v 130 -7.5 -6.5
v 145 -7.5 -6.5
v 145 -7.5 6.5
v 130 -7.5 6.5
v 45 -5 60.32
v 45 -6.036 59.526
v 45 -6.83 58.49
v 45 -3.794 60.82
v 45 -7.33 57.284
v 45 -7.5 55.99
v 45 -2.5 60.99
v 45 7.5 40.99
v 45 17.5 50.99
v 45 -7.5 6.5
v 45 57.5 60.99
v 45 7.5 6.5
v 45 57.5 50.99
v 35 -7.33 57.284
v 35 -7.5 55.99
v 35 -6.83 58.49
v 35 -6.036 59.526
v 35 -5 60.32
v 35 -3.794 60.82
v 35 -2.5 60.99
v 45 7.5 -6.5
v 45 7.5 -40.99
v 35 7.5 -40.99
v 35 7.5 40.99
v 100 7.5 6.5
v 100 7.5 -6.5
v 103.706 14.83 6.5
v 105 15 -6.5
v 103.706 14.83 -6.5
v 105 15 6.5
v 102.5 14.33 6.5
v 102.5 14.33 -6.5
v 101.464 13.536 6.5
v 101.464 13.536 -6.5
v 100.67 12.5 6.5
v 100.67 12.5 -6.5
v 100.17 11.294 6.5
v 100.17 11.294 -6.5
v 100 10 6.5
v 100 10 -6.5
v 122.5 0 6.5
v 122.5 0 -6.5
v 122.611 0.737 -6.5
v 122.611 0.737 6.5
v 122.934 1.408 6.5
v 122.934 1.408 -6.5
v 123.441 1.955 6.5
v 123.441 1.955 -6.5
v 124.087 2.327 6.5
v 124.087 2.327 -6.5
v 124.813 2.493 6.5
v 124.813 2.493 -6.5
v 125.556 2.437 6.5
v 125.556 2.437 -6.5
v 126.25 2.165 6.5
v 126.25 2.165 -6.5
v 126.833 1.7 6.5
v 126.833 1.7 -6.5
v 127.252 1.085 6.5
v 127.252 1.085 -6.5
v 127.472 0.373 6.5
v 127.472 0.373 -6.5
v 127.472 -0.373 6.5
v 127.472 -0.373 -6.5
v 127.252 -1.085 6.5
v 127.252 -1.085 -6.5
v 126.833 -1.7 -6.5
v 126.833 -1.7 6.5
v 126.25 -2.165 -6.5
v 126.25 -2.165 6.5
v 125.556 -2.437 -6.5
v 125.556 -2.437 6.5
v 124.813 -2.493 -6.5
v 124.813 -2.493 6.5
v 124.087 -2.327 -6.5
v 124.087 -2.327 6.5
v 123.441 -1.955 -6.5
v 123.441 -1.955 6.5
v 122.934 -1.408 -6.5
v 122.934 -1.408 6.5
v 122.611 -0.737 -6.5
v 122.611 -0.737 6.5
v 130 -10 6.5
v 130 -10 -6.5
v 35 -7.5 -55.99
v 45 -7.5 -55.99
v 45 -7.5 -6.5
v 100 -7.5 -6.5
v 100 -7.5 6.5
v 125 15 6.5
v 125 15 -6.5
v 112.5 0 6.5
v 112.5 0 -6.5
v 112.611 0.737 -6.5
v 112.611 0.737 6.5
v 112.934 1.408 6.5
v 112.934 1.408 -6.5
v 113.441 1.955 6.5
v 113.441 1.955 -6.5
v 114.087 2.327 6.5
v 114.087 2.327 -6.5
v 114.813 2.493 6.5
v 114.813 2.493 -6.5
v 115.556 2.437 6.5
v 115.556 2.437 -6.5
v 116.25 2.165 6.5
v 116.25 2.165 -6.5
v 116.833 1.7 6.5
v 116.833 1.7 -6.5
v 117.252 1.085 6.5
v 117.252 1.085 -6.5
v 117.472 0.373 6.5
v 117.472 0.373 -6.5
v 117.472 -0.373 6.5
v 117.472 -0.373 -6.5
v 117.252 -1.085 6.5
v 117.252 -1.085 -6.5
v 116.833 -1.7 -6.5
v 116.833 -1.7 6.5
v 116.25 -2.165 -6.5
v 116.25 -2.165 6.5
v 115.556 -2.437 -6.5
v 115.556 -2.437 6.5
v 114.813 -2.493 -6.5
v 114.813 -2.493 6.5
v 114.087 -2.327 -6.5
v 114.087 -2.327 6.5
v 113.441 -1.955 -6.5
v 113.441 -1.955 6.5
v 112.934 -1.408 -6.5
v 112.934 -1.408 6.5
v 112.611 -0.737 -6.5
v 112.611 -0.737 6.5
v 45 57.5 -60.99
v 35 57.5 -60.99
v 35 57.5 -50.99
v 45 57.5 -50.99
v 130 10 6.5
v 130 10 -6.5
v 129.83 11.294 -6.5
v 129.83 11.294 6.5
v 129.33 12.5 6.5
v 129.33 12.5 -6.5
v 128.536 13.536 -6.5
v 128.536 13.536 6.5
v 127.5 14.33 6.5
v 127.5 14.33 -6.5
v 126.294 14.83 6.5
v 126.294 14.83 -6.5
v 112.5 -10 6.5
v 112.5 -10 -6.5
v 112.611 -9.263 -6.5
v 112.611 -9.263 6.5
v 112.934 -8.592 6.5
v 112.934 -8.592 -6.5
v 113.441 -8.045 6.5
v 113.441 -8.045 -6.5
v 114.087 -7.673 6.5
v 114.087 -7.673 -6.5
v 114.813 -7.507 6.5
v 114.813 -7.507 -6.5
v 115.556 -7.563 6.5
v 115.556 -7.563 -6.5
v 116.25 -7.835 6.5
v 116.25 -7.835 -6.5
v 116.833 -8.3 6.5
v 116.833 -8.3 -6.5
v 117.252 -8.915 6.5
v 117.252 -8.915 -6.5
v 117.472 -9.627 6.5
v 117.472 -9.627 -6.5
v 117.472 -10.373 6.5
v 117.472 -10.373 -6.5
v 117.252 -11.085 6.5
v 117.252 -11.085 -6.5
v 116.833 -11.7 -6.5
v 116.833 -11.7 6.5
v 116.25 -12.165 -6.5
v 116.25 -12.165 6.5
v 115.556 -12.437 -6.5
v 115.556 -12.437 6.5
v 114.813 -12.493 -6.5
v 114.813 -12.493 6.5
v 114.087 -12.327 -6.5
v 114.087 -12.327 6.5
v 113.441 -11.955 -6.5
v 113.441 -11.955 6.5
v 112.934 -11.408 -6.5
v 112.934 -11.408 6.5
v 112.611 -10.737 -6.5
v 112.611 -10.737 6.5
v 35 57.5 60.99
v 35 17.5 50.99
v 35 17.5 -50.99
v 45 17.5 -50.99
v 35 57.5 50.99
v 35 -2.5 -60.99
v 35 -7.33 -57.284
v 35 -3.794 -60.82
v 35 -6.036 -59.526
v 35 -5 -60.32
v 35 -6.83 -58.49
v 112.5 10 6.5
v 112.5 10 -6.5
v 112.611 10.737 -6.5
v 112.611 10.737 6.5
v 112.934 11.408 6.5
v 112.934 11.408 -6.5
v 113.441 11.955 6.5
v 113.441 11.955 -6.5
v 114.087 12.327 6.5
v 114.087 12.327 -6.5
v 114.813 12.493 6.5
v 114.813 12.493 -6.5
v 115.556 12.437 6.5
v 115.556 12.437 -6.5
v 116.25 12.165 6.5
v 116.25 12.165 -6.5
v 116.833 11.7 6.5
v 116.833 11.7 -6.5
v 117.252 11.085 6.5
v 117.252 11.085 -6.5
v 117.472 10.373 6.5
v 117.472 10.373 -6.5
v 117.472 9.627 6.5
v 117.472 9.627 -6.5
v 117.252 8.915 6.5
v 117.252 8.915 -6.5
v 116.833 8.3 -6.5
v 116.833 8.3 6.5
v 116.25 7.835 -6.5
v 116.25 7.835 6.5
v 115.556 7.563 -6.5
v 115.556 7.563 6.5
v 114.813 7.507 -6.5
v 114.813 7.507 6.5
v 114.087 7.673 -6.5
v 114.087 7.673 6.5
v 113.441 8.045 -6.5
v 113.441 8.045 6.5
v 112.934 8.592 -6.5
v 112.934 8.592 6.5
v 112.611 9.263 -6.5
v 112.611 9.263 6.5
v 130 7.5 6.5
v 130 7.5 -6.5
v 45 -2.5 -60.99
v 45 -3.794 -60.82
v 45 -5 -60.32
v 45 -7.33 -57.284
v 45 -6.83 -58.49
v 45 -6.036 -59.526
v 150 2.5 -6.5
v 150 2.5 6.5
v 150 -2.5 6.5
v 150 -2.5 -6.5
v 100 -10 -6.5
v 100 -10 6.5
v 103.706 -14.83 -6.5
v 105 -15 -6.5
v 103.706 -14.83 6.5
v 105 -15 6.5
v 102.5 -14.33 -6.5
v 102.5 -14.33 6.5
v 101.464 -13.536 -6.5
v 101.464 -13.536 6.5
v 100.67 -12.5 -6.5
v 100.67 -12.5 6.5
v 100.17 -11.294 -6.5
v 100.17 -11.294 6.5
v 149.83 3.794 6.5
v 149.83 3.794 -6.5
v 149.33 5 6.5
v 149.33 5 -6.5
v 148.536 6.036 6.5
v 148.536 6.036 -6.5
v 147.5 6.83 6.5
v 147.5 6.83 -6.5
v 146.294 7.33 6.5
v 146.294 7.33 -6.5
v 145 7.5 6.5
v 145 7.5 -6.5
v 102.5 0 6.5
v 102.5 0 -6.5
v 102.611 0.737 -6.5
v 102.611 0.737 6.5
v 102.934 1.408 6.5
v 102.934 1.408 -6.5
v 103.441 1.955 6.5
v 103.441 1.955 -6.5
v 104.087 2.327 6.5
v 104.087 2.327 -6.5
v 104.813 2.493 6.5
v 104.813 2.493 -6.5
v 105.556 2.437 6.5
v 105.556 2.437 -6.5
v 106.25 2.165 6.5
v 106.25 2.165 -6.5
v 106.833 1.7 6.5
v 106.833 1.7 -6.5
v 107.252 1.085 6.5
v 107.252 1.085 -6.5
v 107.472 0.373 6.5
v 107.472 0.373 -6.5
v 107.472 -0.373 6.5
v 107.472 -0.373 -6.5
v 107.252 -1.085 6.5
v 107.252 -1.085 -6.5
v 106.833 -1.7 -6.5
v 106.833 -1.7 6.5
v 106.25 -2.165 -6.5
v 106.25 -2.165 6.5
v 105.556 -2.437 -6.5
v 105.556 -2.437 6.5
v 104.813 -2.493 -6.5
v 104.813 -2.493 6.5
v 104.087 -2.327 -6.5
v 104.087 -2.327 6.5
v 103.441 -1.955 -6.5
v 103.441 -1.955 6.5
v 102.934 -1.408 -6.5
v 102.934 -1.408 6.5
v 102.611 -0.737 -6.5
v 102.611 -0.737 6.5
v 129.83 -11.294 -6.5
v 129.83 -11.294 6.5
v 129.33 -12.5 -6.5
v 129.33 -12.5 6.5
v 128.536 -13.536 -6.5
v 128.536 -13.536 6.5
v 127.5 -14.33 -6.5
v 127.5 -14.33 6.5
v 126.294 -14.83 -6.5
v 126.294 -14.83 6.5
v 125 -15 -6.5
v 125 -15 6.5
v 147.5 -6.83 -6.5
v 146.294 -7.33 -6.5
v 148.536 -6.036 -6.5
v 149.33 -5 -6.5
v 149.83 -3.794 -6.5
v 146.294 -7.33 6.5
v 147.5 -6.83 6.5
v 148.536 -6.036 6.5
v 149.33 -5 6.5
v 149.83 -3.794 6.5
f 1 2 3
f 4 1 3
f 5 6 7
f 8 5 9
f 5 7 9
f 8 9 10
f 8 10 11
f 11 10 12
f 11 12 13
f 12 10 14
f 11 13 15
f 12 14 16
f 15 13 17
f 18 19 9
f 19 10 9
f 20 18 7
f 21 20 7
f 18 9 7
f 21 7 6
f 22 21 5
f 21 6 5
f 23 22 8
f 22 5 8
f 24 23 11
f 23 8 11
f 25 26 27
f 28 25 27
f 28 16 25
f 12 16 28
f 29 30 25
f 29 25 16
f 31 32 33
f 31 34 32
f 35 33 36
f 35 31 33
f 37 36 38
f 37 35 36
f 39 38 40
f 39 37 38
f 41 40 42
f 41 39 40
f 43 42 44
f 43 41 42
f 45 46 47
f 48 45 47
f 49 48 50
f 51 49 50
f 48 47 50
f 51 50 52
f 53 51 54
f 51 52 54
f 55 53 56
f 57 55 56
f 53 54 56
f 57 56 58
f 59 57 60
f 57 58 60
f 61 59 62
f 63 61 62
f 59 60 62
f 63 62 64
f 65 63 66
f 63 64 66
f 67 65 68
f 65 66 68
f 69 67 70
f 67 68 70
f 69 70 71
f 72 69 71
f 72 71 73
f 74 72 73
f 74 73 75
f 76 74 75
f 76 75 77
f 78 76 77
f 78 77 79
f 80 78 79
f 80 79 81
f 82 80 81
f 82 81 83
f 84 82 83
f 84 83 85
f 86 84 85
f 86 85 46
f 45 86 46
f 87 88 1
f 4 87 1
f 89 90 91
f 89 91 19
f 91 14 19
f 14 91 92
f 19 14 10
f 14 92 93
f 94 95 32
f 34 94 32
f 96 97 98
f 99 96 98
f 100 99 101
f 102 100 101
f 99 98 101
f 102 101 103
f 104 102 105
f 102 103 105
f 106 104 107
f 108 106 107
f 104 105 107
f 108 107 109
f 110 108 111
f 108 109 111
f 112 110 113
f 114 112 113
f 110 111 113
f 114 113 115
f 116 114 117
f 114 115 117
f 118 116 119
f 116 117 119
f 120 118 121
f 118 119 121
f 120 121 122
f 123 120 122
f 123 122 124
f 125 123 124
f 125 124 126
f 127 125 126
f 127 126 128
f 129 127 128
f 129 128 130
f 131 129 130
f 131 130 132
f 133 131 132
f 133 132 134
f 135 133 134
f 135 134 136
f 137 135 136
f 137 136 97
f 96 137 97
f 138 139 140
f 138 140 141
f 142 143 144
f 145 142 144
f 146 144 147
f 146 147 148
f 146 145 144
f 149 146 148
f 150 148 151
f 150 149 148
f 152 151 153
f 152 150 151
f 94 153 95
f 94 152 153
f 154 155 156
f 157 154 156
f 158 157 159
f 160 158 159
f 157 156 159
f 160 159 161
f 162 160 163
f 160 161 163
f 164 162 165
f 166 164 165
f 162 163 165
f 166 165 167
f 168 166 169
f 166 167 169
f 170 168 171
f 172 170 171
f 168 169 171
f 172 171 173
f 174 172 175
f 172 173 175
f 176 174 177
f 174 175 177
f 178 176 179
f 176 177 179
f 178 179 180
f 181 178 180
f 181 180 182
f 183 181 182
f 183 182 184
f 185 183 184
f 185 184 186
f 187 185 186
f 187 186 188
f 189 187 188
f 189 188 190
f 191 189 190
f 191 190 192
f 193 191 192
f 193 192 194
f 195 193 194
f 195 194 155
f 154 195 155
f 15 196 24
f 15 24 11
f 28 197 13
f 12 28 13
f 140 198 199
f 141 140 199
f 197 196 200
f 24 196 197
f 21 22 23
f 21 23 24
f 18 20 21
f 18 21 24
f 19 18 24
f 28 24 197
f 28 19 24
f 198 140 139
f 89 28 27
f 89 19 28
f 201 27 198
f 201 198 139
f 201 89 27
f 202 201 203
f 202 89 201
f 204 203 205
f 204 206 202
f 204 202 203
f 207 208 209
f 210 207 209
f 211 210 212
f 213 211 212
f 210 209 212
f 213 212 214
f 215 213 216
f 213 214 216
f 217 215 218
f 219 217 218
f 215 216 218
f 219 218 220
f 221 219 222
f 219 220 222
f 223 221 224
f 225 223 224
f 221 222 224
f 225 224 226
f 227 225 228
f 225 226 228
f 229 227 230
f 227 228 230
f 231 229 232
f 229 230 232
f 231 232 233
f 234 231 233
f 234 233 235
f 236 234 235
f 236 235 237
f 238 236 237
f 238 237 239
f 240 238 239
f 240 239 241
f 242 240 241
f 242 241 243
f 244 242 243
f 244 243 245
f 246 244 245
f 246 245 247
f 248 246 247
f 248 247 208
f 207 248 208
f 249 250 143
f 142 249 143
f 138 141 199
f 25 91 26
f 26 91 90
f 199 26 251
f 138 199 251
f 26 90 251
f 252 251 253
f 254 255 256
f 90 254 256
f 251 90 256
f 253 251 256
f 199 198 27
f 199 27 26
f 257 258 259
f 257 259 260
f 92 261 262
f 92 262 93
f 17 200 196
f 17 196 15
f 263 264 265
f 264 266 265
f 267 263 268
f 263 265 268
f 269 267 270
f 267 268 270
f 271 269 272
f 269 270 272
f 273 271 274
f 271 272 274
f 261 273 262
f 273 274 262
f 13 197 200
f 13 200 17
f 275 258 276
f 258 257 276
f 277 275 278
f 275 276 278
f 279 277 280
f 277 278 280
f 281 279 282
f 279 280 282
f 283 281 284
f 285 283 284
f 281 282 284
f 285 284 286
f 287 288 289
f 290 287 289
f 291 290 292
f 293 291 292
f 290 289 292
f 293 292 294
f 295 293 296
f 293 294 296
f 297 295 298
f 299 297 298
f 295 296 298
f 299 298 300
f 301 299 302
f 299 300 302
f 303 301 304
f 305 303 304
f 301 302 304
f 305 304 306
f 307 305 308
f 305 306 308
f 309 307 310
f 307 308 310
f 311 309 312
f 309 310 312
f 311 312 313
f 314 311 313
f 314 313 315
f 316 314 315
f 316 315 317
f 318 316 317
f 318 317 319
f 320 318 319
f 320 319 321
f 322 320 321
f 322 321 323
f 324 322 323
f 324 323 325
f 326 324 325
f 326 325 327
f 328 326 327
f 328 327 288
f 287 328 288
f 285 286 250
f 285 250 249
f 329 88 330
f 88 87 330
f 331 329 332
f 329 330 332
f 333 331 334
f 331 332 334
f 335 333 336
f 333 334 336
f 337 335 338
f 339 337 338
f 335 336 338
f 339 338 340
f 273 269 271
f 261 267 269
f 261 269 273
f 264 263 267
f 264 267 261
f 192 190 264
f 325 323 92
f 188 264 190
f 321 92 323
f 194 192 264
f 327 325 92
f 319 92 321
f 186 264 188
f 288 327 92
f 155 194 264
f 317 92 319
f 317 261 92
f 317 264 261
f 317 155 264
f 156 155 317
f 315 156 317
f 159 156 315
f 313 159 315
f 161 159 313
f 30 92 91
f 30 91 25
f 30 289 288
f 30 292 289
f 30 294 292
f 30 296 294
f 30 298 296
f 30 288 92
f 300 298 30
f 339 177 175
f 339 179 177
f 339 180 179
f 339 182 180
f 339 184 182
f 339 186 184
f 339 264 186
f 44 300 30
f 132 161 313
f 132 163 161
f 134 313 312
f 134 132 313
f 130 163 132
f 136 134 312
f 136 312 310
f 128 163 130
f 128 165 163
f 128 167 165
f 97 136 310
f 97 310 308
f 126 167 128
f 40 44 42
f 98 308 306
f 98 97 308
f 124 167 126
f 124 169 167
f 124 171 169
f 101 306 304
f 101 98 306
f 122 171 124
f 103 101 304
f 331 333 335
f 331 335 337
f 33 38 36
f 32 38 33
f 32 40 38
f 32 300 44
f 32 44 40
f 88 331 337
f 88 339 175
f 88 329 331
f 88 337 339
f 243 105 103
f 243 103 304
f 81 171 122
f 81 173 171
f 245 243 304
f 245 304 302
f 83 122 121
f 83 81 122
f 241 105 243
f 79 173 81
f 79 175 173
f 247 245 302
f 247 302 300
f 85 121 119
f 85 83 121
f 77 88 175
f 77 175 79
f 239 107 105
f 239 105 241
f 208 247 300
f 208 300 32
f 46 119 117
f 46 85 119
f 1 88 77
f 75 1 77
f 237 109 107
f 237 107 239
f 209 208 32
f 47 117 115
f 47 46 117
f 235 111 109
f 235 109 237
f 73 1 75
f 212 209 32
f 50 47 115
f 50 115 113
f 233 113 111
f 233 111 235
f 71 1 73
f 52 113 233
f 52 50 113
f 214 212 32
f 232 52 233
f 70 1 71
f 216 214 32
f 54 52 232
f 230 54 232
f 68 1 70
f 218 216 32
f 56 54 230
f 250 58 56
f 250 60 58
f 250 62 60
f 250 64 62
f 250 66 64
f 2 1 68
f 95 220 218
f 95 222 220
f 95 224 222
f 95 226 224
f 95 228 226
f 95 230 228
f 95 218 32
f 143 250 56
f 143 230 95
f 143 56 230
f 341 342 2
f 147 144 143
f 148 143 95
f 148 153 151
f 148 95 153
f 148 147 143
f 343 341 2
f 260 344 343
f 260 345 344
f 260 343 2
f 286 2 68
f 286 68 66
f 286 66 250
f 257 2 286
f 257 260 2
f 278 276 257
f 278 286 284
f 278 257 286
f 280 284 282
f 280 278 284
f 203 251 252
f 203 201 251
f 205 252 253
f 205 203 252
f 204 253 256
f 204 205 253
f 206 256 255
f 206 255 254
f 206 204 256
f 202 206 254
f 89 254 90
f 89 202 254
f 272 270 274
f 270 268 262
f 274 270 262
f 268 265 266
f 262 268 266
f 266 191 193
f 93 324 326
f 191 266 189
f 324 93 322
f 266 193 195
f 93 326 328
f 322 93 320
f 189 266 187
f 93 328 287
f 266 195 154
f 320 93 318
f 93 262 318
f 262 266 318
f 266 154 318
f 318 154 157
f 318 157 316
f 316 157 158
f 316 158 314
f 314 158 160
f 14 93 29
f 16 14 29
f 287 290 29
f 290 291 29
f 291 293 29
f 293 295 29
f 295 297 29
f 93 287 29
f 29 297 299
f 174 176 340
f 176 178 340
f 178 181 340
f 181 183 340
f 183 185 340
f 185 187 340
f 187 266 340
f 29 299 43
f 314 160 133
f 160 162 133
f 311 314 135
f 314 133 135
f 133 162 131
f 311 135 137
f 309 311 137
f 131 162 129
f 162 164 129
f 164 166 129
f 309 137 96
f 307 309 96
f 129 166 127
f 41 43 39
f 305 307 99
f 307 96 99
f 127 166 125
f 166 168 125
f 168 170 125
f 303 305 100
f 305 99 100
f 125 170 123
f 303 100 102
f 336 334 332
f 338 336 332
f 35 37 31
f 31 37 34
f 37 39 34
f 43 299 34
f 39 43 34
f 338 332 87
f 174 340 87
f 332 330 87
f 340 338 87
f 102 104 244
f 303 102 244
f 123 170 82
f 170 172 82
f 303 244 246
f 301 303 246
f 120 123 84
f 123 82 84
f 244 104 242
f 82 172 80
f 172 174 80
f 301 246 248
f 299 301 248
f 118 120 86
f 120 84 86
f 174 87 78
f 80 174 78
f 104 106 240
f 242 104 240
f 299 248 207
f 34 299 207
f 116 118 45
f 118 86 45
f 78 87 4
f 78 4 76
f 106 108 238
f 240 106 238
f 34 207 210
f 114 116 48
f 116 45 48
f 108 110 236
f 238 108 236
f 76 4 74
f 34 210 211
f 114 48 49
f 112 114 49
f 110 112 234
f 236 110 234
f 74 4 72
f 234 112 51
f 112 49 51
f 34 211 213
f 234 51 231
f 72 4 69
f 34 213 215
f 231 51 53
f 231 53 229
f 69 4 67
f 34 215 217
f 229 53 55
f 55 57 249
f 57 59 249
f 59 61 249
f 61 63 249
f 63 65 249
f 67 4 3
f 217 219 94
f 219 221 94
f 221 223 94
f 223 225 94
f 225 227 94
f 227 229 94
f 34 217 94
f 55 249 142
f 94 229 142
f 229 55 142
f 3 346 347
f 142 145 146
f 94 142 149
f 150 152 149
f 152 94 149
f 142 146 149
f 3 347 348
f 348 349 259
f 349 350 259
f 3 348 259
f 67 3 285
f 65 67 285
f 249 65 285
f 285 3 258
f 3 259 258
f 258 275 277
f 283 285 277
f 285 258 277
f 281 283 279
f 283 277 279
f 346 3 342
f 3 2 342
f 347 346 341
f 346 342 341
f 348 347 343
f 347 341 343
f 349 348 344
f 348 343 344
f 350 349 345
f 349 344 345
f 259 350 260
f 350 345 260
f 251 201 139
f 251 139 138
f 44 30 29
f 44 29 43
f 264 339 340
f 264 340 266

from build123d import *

# Parameters (mm, degrees)
SKETCH1_W            = 13
SKETCH1_H            = 15
BOSS_EXTRUDE1_DEPTH  = 150
SKETCH5_R            = 2.5
CUT_EXTRUDE3_DEPTH   = 151.748963512
SKETCH8_W            = 13
SKETCH8_H            = 15
BOSS_EXTRUDE3_DEPTH  = 15
SKETCH10_R           = 1.6
CUT_EXTRUDE4_DEPTH   = 151.888203648
SKETCH11_W           = 30
SKETCH11_H           = 30
BOSS_EXTRUDE4_DEPTH  = 13
SKETCH12_R           = 2.5
CUT_EXTRUDE5_DEPTH   = 152.307633647
FILLET1_R            = 5
FILLET2_R            = 5
SKETCH13_R           = 3
CUT_EXTRUDE6_DEPTH   = 152.81732444
SKETCH15_W           = 13
SKETCH15_H           = 15
BOSS_EXTRUDE5_DEPTH  = 40
SKETCH23_W           = 10
SKETCH23_H           = 15
BOSS_EXTRUDE10_DEPTH = 54.49
SKETCH24_W           = 10
SKETCH24_H           = 15
BOSS_EXTRUDE11_DEPTH = 54.49
SKETCH27_W           = 10
SKETCH27_H           = 10
BOSS_EXTRUDE13_DEPTH = 50
SKETCH28_W           = 90
SKETCH28_H           = 13
CUT_EXTRUDE15_DEPTH  = 175.48432623
CHAMFER1_SIZE        = 10
FILLET3_R            = 5


with BuildPart() as part:
    # Sketch1 → Boss-Extrude1 (new body)
    with BuildSketch(Plane(origin=(0, 0, 0), x_dir=(0, 0, -1), z_dir=(1, 0, 0))):
        Rectangle(SKETCH1_W, SKETCH1_H)
    extrude(amount=BOSS_EXTRUDE1_DEPTH)

    # Sketch5 → Cut-Extrude3 (cut, through all)
    with BuildSketch(Plane.XY.offset(6.5)):
        with Locations((115, 0)):
            Circle(SKETCH5_R)
        with Locations((125, 0)):
            Circle(SKETCH5_R)
        with Locations((105, 0)):
            Circle(SKETCH5_R)
    extrude(amount=-CUT_EXTRUDE3_DEPTH, mode=Mode.SUBTRACT)

    # Sketch8 → Boss-Extrude3 (add)
    with BuildSketch(Plane.ZY):
        Rectangle(SKETCH8_W, SKETCH8_H)
    extrude(amount=BOSS_EXTRUDE3_DEPTH)

    # Sketch10 → Cut-Extrude4 (cut, through all)
    with BuildSketch(Plane(origin=(0, -7.5, 0), x_dir=(-1, 0, 0), z_dir=(0, -1, 0))):
        with Locations(Location((7, 0, 0), (0, 0, 90))):
            Circle(SKETCH10_R)
        with Locations(Location((-12, 0, 0), (0, 0, 90))):
            Circle(SKETCH10_R)
    extrude(amount=-CUT_EXTRUDE4_DEPTH, mode=Mode.SUBTRACT)

    # Sketch11 → Boss-Extrude4 (add)
    with BuildSketch(Plane(origin=(0, 0, -6.5), x_dir=(-1, 0, 0), z_dir=(0, 0, -1))):
        with Locations((-115, 0)):
            Rectangle(SKETCH11_W, SKETCH11_H)
    extrude(amount=-BOSS_EXTRUDE4_DEPTH)

    # Sketch12 → Cut-Extrude5 (cut, through all)
    with BuildSketch(Plane(origin=(0, 0, -6.5), x_dir=(-1, 0, 0), z_dir=(0, 0, -1))):
        with Locations((-115, 10)):
            Circle(SKETCH12_R)
        with Locations((-105, 0)):
            Circle(SKETCH12_R)
        with Locations((-125, 0)):
            Circle(SKETCH12_R)
        with Locations((-115, 0)):
            Circle(SKETCH12_R)
        with Locations((-115, -10)):
            Circle(SKETCH12_R)
    extrude(amount=-CUT_EXTRUDE5_DEPTH, mode=Mode.SUBTRACT)

    # Fillet1
    fillet1_edges = [part.edges().sort_by_distance(p)[0] for p in [
        (100, 15, 0),
        (130, -15, 0),
        (100, -15, 0),
        (130, 15, 0),
    ]]
    fillet(fillet1_edges, radius=FILLET1_R)

    # Fillet2
    fillet2_edges = [part.edges().sort_by_distance(p)[0] for p in [
        (150, -7.5, 0),
        (150, 7.5, 0),
    ]]
    fillet(fillet2_edges, radius=FILLET2_R)

    # Sketch13 → Cut-Extrude6 (cut, through all)
    with BuildSketch(Plane(origin=(0, 7.5, 0), x_dir=(1, 0, 0), z_dir=(0, 1, 0))):
        with Locations(Location((2.5, 0, 0), (0, 0, 270))):
            Circle(SKETCH13_R)
    extrude(amount=-CUT_EXTRUDE6_DEPTH, mode=Mode.SUBTRACT)

    # Sketch15 → Boss-Extrude5 (add)
    with BuildSketch(Plane.ZY.offset(15)):
        Rectangle(SKETCH15_W, SKETCH15_H)
    extrude(amount=BOSS_EXTRUDE5_DEPTH)

    # Sketch23 → Boss-Extrude10 (add)
    with BuildSketch(Plane.XY.offset(6.5)):
        with Locations((40, 0)):
            Rectangle(SKETCH23_W, SKETCH23_H)
    extrude(amount=BOSS_EXTRUDE10_DEPTH)

    # Sketch24 → Boss-Extrude11 (add)
    with BuildSketch(Plane(origin=(0, 0, -6.5), x_dir=(-1, 0, 0), z_dir=(0, 0, -1))):
        with Locations((-40, 0)):
            Rectangle(SKETCH24_W, SKETCH24_H)
    extrude(amount=BOSS_EXTRUDE11_DEPTH)

    # Sketch27 → Boss-Extrude13 (add)
    with BuildSketch(Plane(origin=(0, 7.5, 0), x_dir=(1, 0, 0), z_dir=(0, 1, 0))):
        with Locations((40, 55.99)):
            Rectangle(SKETCH27_W, SKETCH27_H)
        with Locations((40, -55.99)):
            Rectangle(SKETCH27_W, SKETCH27_H)
    extrude(amount=BOSS_EXTRUDE13_DEPTH)

    # Sketch28 → Cut-Extrude15 (cut, through all)
    with BuildSketch(Plane.XZ.offset(7.5)):
        with Locations((-10, 0)):
            Rectangle(SKETCH28_W, SKETCH28_H)
    extrude(amount=-CUT_EXTRUDE15_DEPTH, mode=Mode.SUBTRACT)

    # Chamfer1
    chamfer1_edges = [part.edges().sort_by_distance(p)[0] for p in [
        (40, 7.5, -50.99),
        (40, 7.5, 50.99),
    ]]
    chamfer(chamfer1_edges, length=CHAMFER1_SIZE)

    # Fillet3
    fillet3_edges = [part.edges().sort_by_distance(p)[0] for p in [
        (40, -7.5, 60.99),
        (40, -7.5, -60.99),
    ]]
    fillet(fillet3_edges, radius=FILLET3_R)


solid = part.part
